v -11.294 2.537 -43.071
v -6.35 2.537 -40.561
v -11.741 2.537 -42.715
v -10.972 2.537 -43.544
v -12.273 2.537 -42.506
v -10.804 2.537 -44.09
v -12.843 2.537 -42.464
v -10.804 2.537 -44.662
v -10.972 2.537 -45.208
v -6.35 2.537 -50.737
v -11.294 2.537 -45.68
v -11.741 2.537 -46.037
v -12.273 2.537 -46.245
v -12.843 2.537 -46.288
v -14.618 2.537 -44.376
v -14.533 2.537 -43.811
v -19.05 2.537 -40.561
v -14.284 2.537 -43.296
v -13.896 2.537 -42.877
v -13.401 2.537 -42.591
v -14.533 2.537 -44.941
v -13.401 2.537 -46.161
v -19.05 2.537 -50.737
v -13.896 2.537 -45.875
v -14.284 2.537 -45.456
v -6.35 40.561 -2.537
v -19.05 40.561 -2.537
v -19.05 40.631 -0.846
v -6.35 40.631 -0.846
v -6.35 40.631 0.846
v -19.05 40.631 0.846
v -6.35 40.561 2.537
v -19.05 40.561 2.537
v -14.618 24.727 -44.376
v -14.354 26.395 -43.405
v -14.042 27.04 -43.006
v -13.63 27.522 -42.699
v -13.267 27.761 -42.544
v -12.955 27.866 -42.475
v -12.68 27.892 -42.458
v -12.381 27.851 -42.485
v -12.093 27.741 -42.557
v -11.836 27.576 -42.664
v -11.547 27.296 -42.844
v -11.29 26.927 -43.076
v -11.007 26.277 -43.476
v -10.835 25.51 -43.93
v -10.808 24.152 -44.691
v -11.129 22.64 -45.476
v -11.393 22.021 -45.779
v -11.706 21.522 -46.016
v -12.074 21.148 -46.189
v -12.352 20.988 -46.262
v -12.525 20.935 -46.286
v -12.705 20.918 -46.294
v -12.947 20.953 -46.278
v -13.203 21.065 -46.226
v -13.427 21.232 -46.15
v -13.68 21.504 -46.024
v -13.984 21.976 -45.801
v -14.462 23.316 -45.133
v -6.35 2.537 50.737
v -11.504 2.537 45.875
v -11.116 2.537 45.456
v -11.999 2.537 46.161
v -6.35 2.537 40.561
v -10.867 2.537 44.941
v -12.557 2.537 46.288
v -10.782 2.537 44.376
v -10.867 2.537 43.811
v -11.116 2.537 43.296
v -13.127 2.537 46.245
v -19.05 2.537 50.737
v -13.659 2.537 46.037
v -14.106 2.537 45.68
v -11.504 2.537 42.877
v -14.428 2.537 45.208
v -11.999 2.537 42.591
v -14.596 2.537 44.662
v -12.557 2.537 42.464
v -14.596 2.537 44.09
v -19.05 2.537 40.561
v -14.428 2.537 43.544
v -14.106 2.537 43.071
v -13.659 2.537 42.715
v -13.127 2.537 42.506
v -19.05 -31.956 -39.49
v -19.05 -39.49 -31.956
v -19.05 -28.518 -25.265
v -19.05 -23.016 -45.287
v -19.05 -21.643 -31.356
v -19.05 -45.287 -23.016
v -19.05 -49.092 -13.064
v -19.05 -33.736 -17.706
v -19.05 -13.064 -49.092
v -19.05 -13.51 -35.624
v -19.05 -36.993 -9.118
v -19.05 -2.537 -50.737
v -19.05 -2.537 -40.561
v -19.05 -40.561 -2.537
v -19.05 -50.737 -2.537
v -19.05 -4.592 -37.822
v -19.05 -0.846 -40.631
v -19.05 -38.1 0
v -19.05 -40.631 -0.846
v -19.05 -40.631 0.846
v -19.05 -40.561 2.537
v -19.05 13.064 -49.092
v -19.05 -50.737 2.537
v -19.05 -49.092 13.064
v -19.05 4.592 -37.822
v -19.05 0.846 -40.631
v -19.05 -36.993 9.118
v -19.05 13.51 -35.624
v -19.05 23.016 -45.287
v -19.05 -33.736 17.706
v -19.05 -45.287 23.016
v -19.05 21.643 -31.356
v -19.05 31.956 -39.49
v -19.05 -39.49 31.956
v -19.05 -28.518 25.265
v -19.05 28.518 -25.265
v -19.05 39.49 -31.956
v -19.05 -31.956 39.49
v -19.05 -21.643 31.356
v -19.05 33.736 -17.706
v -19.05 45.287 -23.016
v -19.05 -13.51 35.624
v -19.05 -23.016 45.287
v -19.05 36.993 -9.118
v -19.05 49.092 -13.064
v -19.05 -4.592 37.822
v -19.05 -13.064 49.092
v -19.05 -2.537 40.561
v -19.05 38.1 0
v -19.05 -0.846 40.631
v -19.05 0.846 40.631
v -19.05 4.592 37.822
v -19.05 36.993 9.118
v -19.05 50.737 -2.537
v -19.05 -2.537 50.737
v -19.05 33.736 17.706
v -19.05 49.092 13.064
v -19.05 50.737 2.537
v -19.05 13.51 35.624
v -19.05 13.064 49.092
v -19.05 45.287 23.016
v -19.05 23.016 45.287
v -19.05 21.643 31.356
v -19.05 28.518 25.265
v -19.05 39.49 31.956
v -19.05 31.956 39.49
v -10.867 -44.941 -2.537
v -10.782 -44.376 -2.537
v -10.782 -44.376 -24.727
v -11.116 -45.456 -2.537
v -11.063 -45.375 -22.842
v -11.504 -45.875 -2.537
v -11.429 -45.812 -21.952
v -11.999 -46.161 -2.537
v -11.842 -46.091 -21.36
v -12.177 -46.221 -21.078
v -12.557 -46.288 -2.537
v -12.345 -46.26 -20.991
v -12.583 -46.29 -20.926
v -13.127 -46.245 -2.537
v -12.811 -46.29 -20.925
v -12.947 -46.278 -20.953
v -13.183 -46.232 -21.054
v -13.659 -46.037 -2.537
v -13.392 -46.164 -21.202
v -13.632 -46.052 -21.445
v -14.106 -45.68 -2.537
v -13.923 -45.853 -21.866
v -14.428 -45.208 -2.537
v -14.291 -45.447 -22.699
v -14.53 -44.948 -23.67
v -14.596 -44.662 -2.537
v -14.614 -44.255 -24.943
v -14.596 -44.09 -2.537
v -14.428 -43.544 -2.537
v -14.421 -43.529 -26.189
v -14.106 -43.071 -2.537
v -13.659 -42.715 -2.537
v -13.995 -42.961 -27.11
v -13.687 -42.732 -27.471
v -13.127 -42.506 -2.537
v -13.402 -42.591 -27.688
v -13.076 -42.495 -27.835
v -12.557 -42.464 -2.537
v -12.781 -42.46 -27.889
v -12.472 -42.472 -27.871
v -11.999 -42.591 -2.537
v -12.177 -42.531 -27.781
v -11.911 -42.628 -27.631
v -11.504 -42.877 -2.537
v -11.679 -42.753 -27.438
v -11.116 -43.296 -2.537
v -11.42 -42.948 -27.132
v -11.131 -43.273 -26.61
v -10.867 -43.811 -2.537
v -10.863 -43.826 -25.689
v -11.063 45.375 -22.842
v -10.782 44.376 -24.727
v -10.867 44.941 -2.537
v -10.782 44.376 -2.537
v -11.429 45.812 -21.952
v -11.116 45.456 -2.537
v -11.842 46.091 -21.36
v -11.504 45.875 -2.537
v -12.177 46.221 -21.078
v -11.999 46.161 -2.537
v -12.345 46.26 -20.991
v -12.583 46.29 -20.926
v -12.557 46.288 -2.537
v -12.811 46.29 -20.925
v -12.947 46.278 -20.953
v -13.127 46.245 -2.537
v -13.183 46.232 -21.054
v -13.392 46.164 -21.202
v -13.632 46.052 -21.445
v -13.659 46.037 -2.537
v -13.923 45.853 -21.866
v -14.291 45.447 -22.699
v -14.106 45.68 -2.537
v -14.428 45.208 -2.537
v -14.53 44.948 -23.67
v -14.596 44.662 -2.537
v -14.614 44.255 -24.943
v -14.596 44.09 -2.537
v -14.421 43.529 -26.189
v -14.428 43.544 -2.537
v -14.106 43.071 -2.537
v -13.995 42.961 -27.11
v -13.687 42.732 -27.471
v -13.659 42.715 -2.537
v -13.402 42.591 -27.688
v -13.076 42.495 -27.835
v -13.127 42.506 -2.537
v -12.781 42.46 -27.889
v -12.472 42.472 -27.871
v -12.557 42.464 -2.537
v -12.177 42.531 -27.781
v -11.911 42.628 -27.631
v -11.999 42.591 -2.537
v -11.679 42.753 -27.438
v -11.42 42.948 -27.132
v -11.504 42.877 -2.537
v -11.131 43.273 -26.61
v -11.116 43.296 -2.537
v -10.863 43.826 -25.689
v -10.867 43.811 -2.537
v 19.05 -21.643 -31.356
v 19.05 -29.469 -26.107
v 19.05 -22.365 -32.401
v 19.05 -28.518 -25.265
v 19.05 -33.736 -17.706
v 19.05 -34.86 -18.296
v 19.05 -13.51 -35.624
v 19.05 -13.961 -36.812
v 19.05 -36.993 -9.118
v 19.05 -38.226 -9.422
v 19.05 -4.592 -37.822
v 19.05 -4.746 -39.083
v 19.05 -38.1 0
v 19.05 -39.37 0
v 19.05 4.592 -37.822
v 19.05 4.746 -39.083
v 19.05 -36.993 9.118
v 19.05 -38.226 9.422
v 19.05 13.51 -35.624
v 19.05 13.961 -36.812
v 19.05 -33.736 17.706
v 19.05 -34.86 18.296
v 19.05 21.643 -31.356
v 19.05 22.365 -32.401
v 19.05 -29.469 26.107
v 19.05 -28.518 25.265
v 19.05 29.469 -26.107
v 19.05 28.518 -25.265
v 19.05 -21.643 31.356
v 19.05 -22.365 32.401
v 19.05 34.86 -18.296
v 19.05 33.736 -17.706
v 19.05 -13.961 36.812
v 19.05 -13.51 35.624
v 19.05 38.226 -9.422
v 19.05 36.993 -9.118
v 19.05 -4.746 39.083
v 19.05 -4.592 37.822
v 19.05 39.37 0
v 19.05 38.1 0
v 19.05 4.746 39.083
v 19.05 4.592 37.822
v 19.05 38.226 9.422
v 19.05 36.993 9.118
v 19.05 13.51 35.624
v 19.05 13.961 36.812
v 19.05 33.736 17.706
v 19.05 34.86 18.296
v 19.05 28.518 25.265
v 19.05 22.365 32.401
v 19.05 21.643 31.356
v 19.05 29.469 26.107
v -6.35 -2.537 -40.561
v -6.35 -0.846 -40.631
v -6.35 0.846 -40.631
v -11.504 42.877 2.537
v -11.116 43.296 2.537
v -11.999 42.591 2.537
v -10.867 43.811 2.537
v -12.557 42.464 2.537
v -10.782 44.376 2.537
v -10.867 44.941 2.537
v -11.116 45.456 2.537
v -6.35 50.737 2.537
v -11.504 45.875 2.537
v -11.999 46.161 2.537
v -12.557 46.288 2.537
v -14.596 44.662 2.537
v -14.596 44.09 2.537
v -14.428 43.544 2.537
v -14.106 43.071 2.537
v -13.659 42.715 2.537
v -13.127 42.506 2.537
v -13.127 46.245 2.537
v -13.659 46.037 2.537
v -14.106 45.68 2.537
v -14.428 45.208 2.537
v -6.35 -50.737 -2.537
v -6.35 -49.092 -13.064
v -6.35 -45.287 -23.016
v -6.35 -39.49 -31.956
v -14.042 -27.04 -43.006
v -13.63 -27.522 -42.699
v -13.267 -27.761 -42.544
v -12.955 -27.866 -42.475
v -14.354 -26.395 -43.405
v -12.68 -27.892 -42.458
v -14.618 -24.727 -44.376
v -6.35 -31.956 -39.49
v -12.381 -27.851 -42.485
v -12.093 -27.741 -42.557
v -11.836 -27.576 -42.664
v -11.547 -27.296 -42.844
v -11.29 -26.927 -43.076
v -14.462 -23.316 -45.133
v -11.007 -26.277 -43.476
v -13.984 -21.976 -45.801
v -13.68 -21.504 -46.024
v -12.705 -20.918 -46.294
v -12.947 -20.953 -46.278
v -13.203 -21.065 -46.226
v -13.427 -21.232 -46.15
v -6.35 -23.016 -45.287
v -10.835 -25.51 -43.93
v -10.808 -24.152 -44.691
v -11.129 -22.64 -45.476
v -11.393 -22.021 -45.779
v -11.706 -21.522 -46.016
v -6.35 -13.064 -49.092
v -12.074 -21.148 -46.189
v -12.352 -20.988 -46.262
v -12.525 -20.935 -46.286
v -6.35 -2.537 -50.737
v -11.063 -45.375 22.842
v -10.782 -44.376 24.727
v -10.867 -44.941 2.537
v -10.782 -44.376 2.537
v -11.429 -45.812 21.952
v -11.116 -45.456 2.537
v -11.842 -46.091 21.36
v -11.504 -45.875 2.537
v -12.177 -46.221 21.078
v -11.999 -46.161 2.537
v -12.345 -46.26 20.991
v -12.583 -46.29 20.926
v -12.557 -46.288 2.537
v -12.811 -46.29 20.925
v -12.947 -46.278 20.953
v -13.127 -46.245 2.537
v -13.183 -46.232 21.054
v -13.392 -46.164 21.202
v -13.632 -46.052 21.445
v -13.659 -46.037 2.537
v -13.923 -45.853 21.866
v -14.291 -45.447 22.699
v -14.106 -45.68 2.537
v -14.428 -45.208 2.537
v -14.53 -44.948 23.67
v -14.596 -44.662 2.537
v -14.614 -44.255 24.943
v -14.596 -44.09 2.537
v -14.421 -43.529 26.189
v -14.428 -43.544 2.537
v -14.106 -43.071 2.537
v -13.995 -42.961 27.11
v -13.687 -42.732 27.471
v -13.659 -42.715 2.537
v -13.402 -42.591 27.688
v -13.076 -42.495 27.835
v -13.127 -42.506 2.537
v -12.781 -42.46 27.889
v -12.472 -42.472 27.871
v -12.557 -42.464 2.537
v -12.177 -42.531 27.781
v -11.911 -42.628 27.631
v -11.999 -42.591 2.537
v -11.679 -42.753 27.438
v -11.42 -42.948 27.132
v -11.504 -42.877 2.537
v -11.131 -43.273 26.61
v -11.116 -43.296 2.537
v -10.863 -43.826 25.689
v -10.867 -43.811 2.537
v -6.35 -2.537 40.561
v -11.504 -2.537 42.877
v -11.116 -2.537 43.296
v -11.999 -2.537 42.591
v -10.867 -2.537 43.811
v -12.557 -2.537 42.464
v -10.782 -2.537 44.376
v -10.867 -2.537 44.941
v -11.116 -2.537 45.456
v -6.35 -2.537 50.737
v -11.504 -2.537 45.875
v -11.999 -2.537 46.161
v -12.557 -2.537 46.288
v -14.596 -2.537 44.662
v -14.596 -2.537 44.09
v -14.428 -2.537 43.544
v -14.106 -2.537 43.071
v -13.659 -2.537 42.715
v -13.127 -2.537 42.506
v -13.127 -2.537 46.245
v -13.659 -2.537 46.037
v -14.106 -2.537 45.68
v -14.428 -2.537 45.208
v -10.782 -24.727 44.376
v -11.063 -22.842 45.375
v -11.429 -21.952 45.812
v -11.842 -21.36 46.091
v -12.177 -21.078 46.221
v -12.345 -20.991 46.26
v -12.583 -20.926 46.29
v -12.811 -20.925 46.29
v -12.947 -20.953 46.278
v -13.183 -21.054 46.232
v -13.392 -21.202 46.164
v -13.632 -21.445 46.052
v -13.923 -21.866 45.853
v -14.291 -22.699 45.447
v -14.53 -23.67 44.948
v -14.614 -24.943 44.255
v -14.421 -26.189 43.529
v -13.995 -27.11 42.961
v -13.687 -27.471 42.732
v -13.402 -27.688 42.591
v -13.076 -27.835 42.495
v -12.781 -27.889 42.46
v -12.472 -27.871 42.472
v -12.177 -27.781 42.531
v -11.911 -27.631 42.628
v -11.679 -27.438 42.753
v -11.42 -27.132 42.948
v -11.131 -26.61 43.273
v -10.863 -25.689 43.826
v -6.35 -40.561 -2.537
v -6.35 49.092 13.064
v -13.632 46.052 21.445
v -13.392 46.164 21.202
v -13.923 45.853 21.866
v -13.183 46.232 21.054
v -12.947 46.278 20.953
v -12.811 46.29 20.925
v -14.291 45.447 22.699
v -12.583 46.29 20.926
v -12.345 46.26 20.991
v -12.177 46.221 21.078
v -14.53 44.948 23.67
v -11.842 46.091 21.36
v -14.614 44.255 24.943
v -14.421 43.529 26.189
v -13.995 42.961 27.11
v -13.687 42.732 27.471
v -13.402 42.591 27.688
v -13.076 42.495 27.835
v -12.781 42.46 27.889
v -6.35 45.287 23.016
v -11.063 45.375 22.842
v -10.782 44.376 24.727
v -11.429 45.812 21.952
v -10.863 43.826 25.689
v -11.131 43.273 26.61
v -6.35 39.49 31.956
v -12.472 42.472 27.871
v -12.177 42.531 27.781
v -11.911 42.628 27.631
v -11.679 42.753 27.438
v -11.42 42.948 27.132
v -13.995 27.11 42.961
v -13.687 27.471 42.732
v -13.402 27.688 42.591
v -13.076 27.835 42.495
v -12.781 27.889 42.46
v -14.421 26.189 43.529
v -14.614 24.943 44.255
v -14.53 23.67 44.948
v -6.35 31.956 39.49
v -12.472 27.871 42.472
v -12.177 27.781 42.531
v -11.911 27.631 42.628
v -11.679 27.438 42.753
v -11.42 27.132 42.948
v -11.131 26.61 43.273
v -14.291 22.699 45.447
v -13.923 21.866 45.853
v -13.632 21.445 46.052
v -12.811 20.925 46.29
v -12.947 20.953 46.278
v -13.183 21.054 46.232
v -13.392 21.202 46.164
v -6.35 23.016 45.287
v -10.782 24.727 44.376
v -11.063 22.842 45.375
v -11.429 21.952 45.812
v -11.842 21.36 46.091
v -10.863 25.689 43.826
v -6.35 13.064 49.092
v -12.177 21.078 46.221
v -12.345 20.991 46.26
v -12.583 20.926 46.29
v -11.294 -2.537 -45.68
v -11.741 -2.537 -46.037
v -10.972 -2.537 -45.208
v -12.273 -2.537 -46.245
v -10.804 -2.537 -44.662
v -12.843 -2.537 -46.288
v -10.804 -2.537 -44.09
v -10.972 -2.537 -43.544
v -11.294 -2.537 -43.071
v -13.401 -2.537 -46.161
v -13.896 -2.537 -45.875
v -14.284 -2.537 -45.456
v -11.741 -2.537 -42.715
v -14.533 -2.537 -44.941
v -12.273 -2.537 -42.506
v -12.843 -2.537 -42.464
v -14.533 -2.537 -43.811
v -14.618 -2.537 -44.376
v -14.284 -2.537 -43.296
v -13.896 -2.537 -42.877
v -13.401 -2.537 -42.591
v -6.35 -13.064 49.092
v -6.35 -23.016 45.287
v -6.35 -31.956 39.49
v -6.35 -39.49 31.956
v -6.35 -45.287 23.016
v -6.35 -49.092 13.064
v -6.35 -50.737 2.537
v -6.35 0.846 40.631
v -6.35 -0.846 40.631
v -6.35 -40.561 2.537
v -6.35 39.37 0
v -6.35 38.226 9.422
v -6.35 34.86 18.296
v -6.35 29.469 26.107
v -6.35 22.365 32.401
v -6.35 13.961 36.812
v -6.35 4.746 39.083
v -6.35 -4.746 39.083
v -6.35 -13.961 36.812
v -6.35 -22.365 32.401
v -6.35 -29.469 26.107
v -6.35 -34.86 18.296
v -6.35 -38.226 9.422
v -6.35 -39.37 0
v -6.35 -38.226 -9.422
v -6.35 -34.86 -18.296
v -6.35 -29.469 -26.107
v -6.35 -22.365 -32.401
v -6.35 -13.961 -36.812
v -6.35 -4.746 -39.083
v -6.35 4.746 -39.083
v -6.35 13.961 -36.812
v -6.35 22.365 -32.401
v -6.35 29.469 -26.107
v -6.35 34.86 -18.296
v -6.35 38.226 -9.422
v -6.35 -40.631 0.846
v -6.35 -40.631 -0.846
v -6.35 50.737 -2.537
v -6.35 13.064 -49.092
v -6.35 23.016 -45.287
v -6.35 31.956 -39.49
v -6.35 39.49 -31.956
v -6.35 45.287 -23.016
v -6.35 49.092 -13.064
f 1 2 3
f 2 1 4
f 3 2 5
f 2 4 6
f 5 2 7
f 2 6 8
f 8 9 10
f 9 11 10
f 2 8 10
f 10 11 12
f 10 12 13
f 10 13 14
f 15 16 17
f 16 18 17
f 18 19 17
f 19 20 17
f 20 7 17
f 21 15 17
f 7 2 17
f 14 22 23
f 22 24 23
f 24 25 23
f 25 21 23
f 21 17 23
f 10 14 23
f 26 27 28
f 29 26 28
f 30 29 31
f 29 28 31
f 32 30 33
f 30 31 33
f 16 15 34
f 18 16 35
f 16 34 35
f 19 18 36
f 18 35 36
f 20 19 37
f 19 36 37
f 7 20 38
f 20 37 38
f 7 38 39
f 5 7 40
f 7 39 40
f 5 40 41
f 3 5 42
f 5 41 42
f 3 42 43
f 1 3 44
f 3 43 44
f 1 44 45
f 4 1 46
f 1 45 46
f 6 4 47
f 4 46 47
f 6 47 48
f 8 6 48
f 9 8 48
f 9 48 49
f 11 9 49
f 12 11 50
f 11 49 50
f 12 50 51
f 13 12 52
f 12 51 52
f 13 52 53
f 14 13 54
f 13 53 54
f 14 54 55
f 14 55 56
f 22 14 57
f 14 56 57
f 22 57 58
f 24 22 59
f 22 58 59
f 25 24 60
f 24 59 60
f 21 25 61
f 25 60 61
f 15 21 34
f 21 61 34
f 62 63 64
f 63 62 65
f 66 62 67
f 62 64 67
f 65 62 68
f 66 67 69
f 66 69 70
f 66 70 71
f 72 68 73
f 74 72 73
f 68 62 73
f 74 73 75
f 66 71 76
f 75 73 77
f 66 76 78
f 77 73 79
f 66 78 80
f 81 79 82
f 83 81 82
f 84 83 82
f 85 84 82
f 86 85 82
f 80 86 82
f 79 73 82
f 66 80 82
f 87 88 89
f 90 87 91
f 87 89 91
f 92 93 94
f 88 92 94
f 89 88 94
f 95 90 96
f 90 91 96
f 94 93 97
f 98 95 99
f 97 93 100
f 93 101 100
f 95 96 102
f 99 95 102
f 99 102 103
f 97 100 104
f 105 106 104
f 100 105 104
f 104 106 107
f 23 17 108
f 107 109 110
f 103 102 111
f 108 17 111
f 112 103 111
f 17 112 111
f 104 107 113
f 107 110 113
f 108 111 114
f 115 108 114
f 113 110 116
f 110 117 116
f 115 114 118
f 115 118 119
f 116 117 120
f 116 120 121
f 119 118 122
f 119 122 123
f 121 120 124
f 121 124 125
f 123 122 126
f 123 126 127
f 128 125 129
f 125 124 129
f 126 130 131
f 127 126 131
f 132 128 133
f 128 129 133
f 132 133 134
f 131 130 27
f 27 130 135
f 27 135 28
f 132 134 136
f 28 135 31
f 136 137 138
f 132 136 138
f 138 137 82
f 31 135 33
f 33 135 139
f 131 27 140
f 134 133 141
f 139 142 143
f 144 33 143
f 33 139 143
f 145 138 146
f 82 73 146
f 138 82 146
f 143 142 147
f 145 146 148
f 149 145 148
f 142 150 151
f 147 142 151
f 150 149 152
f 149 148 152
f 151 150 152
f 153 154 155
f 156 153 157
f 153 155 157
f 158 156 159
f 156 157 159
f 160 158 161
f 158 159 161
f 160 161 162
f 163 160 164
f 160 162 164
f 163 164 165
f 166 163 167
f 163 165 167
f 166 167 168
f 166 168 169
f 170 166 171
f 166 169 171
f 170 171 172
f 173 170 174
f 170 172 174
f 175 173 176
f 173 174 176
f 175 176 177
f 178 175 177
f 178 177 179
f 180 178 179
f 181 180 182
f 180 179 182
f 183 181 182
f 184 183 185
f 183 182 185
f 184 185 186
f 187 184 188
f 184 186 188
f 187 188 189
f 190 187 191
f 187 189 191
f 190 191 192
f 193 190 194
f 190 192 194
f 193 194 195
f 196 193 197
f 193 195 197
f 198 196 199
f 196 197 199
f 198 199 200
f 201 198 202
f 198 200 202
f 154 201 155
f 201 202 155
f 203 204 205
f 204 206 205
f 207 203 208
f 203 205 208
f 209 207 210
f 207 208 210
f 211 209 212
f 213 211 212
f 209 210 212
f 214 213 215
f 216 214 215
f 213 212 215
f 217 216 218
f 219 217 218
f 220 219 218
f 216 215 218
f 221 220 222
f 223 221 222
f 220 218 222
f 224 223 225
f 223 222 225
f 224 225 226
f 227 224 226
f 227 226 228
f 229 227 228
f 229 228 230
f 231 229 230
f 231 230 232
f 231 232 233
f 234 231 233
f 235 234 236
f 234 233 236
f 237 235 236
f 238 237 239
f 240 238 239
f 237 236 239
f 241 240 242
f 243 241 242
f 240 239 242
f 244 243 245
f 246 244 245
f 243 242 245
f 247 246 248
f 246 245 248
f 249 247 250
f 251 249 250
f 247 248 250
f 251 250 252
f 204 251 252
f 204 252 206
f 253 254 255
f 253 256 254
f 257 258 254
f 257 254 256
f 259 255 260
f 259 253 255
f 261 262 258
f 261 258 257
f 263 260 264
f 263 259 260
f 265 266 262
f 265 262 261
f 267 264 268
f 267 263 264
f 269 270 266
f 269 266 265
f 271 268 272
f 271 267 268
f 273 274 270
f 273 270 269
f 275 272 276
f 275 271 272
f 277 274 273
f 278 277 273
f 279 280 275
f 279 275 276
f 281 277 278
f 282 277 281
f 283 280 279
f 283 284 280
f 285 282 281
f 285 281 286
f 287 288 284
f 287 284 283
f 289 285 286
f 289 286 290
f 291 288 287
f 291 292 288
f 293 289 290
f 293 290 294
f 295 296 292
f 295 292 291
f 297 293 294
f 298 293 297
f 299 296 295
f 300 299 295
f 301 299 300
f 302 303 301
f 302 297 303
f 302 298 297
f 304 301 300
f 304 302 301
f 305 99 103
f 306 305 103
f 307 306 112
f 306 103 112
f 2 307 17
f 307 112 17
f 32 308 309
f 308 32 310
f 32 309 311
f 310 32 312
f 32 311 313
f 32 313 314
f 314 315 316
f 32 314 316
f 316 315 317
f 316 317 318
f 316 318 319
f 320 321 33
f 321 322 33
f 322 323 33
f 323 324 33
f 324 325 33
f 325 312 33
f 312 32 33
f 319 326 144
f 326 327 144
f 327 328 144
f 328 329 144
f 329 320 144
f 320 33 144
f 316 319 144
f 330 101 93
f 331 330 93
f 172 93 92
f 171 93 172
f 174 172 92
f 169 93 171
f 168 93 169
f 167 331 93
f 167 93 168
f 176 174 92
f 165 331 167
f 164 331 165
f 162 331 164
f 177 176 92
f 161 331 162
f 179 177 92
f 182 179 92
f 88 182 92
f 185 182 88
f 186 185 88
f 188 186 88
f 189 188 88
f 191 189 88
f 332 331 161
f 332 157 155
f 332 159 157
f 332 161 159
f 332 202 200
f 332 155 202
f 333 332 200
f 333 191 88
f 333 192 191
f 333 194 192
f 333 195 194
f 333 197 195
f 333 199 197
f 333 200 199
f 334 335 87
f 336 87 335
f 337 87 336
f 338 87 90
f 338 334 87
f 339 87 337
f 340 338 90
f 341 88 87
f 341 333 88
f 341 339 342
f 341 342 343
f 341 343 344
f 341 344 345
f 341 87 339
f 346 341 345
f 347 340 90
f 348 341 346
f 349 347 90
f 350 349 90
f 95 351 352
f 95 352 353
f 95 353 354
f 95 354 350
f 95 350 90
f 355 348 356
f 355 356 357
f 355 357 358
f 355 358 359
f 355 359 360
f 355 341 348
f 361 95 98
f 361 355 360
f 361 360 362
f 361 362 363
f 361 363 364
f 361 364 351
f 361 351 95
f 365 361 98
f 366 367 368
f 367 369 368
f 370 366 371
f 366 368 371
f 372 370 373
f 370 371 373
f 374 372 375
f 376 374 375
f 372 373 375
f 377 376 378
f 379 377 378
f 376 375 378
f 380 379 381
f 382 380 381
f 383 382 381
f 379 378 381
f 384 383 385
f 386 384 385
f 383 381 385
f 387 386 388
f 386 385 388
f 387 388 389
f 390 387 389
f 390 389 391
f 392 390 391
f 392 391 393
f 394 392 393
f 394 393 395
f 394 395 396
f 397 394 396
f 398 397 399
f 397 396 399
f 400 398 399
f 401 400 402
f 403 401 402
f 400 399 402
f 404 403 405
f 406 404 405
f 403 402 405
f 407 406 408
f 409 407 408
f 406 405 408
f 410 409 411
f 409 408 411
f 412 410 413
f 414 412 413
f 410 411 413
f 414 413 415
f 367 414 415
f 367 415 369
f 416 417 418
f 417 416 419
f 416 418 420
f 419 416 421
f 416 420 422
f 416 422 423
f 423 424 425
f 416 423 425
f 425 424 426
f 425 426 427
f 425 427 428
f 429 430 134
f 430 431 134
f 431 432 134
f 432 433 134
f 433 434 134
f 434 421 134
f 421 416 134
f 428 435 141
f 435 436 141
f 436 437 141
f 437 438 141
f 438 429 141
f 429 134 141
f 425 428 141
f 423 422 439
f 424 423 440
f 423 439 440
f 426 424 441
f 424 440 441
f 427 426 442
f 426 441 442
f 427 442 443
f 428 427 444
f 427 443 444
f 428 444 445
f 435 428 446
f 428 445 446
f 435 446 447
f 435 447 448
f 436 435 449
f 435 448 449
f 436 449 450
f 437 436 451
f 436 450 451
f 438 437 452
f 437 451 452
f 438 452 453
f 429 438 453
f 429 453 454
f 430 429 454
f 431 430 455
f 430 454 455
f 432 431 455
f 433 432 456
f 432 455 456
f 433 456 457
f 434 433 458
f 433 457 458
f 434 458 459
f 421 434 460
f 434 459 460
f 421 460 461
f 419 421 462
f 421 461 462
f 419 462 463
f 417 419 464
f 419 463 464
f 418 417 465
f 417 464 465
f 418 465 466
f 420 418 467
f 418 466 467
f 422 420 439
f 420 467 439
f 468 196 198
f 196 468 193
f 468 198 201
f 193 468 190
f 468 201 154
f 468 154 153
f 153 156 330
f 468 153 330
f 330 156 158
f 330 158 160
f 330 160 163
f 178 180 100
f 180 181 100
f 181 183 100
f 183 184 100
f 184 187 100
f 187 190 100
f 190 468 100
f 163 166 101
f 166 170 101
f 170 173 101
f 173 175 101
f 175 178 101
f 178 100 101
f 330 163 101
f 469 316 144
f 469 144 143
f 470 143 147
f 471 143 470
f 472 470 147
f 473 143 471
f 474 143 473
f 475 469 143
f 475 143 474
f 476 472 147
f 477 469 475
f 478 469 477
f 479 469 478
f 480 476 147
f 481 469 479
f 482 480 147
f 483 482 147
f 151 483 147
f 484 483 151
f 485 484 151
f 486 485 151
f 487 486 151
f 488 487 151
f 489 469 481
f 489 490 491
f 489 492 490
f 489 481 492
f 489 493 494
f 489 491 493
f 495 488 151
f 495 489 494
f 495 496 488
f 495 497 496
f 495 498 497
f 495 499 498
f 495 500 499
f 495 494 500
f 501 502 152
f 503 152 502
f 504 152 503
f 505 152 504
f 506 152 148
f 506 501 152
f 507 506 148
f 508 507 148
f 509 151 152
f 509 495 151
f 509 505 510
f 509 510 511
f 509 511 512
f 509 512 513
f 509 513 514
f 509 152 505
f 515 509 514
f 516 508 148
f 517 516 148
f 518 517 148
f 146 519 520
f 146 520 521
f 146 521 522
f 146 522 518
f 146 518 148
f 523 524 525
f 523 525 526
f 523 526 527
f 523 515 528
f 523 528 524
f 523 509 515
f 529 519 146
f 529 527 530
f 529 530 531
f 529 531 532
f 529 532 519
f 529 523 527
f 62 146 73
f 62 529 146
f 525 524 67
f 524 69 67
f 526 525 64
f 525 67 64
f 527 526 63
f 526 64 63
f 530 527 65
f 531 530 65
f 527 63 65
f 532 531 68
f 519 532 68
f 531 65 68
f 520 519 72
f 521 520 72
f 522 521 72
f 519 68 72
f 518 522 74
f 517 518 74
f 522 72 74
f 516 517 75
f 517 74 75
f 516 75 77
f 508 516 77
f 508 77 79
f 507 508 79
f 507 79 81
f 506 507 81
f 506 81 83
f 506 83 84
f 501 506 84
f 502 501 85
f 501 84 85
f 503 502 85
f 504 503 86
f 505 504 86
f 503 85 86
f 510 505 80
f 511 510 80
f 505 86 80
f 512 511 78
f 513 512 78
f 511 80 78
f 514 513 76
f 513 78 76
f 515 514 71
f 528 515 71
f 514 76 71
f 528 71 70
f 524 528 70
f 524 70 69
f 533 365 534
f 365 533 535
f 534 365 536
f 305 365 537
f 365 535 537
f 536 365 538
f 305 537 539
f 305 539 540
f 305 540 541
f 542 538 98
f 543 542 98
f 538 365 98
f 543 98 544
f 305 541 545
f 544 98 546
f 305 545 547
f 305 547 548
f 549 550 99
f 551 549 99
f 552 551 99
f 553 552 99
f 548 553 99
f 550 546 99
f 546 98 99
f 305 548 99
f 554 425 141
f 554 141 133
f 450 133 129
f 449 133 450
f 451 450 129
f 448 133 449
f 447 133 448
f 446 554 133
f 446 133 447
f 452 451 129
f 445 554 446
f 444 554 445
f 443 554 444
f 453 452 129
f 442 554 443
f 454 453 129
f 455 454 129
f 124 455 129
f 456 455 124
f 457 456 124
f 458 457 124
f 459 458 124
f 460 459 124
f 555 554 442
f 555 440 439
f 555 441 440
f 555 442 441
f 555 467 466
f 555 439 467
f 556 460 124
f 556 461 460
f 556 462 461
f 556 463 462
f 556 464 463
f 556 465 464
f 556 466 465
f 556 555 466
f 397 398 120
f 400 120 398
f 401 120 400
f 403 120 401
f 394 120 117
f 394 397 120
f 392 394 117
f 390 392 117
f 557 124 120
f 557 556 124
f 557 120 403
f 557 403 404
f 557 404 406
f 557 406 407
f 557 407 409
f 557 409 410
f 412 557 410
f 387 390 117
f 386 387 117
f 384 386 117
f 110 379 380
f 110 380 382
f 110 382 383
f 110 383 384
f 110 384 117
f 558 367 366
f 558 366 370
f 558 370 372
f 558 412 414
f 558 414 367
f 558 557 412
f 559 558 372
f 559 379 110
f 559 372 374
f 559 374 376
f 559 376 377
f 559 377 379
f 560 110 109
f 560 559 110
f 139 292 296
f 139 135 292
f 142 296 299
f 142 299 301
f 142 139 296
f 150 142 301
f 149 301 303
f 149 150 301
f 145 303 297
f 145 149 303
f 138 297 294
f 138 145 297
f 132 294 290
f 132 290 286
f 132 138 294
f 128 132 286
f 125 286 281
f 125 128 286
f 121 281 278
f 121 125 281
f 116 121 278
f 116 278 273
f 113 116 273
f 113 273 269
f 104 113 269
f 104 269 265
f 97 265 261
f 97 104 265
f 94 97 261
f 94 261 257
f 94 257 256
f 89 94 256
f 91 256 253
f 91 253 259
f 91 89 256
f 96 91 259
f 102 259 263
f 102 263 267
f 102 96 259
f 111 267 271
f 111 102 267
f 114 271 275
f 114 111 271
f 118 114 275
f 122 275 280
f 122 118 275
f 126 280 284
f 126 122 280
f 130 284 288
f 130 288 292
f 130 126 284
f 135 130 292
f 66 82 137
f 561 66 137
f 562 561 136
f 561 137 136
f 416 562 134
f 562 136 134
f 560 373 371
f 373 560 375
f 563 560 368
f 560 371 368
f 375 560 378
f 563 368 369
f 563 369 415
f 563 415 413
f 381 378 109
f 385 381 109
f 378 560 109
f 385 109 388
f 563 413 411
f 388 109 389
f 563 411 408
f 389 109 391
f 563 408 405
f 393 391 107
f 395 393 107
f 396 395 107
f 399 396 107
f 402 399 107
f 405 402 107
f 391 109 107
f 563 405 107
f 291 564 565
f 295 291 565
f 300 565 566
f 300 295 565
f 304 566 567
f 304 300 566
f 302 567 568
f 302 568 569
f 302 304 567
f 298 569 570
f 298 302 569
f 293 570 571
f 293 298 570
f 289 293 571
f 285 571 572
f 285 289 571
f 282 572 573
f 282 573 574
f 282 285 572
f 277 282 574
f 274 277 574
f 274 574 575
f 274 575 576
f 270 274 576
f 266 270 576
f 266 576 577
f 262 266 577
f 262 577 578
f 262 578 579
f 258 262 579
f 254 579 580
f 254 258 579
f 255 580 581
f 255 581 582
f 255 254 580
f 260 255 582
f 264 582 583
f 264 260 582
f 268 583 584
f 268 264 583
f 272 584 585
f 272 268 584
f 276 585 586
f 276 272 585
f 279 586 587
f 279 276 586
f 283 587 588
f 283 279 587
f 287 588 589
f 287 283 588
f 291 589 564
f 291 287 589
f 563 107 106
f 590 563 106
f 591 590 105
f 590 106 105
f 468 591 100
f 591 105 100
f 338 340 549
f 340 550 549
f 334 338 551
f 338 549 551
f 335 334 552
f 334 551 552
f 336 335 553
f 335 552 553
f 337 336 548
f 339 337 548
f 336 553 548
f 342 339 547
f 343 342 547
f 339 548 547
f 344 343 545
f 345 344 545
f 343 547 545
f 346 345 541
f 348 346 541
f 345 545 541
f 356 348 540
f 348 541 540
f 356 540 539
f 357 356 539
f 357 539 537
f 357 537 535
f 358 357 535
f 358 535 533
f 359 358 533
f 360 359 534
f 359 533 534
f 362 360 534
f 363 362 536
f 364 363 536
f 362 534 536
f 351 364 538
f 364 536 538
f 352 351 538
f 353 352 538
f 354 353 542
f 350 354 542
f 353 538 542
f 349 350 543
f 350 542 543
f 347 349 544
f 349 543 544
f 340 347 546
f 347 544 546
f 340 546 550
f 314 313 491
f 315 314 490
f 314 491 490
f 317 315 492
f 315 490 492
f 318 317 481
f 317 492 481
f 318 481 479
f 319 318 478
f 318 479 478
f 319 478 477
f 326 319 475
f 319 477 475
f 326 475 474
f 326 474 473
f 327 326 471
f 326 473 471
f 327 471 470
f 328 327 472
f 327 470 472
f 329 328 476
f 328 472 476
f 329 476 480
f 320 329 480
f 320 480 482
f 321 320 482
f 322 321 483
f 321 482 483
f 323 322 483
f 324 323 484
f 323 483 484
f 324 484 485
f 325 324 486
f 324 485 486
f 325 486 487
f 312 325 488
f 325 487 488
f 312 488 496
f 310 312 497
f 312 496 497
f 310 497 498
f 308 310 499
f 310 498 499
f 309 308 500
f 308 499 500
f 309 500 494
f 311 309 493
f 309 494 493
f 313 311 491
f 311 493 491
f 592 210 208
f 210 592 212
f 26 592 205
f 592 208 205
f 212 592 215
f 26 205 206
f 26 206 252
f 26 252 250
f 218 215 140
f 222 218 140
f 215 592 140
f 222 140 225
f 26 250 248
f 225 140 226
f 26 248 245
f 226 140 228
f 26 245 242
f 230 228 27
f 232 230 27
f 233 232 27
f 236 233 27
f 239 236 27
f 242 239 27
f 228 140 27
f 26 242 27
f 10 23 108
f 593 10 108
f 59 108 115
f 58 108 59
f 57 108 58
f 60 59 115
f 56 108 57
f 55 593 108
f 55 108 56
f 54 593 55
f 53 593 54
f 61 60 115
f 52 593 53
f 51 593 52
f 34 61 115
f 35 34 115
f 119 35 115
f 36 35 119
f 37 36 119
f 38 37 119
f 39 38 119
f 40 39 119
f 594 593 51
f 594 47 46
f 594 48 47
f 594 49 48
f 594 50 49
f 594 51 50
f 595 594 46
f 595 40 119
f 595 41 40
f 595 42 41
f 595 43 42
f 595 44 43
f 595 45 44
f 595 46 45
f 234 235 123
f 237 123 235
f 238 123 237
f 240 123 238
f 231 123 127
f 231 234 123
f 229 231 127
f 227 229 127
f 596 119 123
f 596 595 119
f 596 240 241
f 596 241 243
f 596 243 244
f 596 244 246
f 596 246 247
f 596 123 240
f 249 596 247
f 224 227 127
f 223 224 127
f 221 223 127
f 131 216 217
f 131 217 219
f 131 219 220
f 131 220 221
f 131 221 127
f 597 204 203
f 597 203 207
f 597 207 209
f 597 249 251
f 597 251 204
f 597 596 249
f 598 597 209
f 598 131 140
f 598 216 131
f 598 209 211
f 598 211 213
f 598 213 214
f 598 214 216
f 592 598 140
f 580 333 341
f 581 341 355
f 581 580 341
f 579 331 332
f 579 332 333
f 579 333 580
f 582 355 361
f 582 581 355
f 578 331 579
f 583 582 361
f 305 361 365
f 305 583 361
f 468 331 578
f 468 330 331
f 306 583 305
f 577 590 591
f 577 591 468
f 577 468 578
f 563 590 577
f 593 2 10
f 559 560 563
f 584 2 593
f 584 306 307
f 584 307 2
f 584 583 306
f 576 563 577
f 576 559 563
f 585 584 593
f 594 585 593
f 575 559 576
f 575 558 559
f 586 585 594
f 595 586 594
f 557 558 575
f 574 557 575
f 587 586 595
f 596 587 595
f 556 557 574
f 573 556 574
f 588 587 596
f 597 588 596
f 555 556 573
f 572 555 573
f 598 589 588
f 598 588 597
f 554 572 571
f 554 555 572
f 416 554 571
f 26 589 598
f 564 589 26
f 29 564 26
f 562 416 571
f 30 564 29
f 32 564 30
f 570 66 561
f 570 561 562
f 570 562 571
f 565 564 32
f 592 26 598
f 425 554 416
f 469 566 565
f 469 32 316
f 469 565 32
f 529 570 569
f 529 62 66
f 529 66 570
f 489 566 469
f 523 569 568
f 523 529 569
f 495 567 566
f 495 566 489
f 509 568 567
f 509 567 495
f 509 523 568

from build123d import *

# Parameters (mm, degrees)
F0_R      = 50.8
F0_R_2    = 38.1
F1_DEPTH  = 19.05
F2_R      = 50.8
F2_R_2    = 39.37
F3_DEPTH  = 25.4
F5_DEPTH  = 12.7
F6_DEPTH  = 12.7
F7_R      = 1.9177
F8_DEPTH  = 31.75
F9_R      = 1.9177
F10_DEPTH = 31.75
F11_R     = 1.9177
F12_DEPTH = 31.75
F13_R     = 1.9177
F14_DEPTH = 31.75


with BuildPart() as f1:
    # F0 (on Right) → F1 (new body, symmetric)
    with BuildSketch(Plane.YZ):
        Circle(F0_R)
        Circle(F0_R_2, mode=Mode.SUBTRACT)
    extrude(amount=F1_DEPTH, both=True)

    # F2 (on face) → F3 (cut)
    with BuildSketch(Plane.YZ.offset(19.05)):
        Circle(F2_R)
        Circle(F2_R_2, mode=Mode.SUBTRACT)
    extrude(amount=-F3_DEPTH, mode=Mode.SUBTRACT)

    # F4 (on face) → F5 (cut)
    with BuildSketch(Plane(origin=(-19.05, 0, 0), x_dir=(0, -1, 0), z_dir=(-1, 0, 0))):
        with BuildLine():
            Line((40.560758, -2.536629), (52.733429, -2.536629))
            Line((52.733429, -2.536629), (52.733429, 2.536629))
            Line((52.733429, 2.536629), (40.560758, 2.536629))
            ThreePointArc((40.560758, 2.536629), (40.64, 0), (40.560758, -2.536629))
        make_face()
        with BuildLine():
            Line((-59.67196, -2.536629), (-40.560758, -2.536629))
            ThreePointArc((-40.560758, -2.536629), (-40.64, 0), (-40.560758, 2.536629))
            Line((-40.560758, 2.536629), (-59.67196, 2.536629))
            Line((-59.67196, 2.536629), (-59.67196, -2.536629))
        make_face()
        with BuildLine():
            Line((-2.536629, -60.94672), (2.536629, -60.94672))
            Line((2.536629, -60.94672), (2.536629, -40.560758))
            ThreePointArc((2.536629, -40.560758), (0, -40.64), (-2.536629, -40.560758))
            Line((-2.536629, -40.560758), (-2.536629, -60.94672))
        make_face()
        with BuildLine():
            Line((2.536629, 40.560758), (2.536629, 60.431999))
            Line((2.536629, 60.431999), (-2.536629, 60.431999))
            Line((-2.536629, 60.431999), (-2.536629, 40.560758))
            ThreePointArc((-2.536629, 40.560758), (0, 40.64), (2.536629, 40.560758))
        make_face()
    extrude(amount=-F5_DEPTH, mode=Mode.SUBTRACT)

    # F4 (on face) → F6 (cut)
    with BuildSketch(Plane(origin=(-19.05, 0, 0), x_dir=(0, -1, 0), z_dir=(-1, 0, 0))):
        with BuildLine():
            Line((40.560758, -2.536629), (52.733429, -2.536629))
            Line((52.733429, -2.536629), (52.733429, 2.536629))
            Line((52.733429, 2.536629), (40.560758, 2.536629))
            ThreePointArc((40.560758, 2.536629), (40.64, 0), (40.560758, -2.536629))
        make_face()
        with BuildLine():
            Line((-59.67196, -2.536629), (-40.560758, -2.536629))
            ThreePointArc((-40.560758, -2.536629), (-40.64, 0), (-40.560758, 2.536629))
            Line((-40.560758, 2.536629), (-59.67196, 2.536629))
            Line((-59.67196, 2.536629), (-59.67196, -2.536629))
        make_face()
        with BuildLine():
            Line((-2.536629, -60.94672), (2.536629, -60.94672))
            Line((2.536629, -60.94672), (2.536629, -40.560758))
            ThreePointArc((2.536629, -40.560758), (0, -40.64), (-2.536629, -40.560758))
            Line((-2.536629, -40.560758), (-2.536629, -60.94672))
        make_face()
        with BuildLine():
            Line((2.536629, 40.560758), (2.536629, 60.431999))
            Line((2.536629, 60.431999), (-2.536629, 60.431999))
            Line((-2.536629, 60.431999), (-2.536629, 40.560758))
            ThreePointArc((-2.536629, 40.560758), (0, 40.64), (2.536629, 40.560758))
        make_face()
    extrude(amount=-F6_DEPTH, mode=Mode.SUBTRACT)

    # F7 (on face) → F8 (cut, symmetric)
    with BuildSketch(Plane(origin=(0, 0, 2.536629), x_dir=(1, 0, 0), z_dir=(0, 0, -1))):
        with Locations((-12.7, 44.37585)):
            Circle(F7_R)
    extrude(amount=F8_DEPTH, both=True, mode=Mode.SUBTRACT)

    # F9 (on face) → F10 (cut, symmetric)
    with BuildSketch(Plane.XY.offset(-2.536629)):
        with Locations((-12.7, 44.37585)):
            Circle(F9_R)
    extrude(amount=F10_DEPTH, both=True, mode=Mode.SUBTRACT)

    # F11 (on face) → F12 (cut, symmetric)
    with BuildSketch(Plane.XZ.offset(-2.536629)):
        with Locations((-12.7, 44.37585)):
            Circle(F11_R)
    extrude(amount=F12_DEPTH, both=True, mode=Mode.SUBTRACT)

    # F13 (on face) → F14 (cut, symmetric)
    with BuildSketch(Plane(origin=(0, -2.536629, 0), x_dir=(-1, 0, 0), z_dir=(0, 1, 0))):
        with Locations((12.7, -44.37585)):
            Circle(F13_R)
    extrude(amount=F14_DEPTH, both=True, mode=Mode.SUBTRACT)


solid = f1.part
